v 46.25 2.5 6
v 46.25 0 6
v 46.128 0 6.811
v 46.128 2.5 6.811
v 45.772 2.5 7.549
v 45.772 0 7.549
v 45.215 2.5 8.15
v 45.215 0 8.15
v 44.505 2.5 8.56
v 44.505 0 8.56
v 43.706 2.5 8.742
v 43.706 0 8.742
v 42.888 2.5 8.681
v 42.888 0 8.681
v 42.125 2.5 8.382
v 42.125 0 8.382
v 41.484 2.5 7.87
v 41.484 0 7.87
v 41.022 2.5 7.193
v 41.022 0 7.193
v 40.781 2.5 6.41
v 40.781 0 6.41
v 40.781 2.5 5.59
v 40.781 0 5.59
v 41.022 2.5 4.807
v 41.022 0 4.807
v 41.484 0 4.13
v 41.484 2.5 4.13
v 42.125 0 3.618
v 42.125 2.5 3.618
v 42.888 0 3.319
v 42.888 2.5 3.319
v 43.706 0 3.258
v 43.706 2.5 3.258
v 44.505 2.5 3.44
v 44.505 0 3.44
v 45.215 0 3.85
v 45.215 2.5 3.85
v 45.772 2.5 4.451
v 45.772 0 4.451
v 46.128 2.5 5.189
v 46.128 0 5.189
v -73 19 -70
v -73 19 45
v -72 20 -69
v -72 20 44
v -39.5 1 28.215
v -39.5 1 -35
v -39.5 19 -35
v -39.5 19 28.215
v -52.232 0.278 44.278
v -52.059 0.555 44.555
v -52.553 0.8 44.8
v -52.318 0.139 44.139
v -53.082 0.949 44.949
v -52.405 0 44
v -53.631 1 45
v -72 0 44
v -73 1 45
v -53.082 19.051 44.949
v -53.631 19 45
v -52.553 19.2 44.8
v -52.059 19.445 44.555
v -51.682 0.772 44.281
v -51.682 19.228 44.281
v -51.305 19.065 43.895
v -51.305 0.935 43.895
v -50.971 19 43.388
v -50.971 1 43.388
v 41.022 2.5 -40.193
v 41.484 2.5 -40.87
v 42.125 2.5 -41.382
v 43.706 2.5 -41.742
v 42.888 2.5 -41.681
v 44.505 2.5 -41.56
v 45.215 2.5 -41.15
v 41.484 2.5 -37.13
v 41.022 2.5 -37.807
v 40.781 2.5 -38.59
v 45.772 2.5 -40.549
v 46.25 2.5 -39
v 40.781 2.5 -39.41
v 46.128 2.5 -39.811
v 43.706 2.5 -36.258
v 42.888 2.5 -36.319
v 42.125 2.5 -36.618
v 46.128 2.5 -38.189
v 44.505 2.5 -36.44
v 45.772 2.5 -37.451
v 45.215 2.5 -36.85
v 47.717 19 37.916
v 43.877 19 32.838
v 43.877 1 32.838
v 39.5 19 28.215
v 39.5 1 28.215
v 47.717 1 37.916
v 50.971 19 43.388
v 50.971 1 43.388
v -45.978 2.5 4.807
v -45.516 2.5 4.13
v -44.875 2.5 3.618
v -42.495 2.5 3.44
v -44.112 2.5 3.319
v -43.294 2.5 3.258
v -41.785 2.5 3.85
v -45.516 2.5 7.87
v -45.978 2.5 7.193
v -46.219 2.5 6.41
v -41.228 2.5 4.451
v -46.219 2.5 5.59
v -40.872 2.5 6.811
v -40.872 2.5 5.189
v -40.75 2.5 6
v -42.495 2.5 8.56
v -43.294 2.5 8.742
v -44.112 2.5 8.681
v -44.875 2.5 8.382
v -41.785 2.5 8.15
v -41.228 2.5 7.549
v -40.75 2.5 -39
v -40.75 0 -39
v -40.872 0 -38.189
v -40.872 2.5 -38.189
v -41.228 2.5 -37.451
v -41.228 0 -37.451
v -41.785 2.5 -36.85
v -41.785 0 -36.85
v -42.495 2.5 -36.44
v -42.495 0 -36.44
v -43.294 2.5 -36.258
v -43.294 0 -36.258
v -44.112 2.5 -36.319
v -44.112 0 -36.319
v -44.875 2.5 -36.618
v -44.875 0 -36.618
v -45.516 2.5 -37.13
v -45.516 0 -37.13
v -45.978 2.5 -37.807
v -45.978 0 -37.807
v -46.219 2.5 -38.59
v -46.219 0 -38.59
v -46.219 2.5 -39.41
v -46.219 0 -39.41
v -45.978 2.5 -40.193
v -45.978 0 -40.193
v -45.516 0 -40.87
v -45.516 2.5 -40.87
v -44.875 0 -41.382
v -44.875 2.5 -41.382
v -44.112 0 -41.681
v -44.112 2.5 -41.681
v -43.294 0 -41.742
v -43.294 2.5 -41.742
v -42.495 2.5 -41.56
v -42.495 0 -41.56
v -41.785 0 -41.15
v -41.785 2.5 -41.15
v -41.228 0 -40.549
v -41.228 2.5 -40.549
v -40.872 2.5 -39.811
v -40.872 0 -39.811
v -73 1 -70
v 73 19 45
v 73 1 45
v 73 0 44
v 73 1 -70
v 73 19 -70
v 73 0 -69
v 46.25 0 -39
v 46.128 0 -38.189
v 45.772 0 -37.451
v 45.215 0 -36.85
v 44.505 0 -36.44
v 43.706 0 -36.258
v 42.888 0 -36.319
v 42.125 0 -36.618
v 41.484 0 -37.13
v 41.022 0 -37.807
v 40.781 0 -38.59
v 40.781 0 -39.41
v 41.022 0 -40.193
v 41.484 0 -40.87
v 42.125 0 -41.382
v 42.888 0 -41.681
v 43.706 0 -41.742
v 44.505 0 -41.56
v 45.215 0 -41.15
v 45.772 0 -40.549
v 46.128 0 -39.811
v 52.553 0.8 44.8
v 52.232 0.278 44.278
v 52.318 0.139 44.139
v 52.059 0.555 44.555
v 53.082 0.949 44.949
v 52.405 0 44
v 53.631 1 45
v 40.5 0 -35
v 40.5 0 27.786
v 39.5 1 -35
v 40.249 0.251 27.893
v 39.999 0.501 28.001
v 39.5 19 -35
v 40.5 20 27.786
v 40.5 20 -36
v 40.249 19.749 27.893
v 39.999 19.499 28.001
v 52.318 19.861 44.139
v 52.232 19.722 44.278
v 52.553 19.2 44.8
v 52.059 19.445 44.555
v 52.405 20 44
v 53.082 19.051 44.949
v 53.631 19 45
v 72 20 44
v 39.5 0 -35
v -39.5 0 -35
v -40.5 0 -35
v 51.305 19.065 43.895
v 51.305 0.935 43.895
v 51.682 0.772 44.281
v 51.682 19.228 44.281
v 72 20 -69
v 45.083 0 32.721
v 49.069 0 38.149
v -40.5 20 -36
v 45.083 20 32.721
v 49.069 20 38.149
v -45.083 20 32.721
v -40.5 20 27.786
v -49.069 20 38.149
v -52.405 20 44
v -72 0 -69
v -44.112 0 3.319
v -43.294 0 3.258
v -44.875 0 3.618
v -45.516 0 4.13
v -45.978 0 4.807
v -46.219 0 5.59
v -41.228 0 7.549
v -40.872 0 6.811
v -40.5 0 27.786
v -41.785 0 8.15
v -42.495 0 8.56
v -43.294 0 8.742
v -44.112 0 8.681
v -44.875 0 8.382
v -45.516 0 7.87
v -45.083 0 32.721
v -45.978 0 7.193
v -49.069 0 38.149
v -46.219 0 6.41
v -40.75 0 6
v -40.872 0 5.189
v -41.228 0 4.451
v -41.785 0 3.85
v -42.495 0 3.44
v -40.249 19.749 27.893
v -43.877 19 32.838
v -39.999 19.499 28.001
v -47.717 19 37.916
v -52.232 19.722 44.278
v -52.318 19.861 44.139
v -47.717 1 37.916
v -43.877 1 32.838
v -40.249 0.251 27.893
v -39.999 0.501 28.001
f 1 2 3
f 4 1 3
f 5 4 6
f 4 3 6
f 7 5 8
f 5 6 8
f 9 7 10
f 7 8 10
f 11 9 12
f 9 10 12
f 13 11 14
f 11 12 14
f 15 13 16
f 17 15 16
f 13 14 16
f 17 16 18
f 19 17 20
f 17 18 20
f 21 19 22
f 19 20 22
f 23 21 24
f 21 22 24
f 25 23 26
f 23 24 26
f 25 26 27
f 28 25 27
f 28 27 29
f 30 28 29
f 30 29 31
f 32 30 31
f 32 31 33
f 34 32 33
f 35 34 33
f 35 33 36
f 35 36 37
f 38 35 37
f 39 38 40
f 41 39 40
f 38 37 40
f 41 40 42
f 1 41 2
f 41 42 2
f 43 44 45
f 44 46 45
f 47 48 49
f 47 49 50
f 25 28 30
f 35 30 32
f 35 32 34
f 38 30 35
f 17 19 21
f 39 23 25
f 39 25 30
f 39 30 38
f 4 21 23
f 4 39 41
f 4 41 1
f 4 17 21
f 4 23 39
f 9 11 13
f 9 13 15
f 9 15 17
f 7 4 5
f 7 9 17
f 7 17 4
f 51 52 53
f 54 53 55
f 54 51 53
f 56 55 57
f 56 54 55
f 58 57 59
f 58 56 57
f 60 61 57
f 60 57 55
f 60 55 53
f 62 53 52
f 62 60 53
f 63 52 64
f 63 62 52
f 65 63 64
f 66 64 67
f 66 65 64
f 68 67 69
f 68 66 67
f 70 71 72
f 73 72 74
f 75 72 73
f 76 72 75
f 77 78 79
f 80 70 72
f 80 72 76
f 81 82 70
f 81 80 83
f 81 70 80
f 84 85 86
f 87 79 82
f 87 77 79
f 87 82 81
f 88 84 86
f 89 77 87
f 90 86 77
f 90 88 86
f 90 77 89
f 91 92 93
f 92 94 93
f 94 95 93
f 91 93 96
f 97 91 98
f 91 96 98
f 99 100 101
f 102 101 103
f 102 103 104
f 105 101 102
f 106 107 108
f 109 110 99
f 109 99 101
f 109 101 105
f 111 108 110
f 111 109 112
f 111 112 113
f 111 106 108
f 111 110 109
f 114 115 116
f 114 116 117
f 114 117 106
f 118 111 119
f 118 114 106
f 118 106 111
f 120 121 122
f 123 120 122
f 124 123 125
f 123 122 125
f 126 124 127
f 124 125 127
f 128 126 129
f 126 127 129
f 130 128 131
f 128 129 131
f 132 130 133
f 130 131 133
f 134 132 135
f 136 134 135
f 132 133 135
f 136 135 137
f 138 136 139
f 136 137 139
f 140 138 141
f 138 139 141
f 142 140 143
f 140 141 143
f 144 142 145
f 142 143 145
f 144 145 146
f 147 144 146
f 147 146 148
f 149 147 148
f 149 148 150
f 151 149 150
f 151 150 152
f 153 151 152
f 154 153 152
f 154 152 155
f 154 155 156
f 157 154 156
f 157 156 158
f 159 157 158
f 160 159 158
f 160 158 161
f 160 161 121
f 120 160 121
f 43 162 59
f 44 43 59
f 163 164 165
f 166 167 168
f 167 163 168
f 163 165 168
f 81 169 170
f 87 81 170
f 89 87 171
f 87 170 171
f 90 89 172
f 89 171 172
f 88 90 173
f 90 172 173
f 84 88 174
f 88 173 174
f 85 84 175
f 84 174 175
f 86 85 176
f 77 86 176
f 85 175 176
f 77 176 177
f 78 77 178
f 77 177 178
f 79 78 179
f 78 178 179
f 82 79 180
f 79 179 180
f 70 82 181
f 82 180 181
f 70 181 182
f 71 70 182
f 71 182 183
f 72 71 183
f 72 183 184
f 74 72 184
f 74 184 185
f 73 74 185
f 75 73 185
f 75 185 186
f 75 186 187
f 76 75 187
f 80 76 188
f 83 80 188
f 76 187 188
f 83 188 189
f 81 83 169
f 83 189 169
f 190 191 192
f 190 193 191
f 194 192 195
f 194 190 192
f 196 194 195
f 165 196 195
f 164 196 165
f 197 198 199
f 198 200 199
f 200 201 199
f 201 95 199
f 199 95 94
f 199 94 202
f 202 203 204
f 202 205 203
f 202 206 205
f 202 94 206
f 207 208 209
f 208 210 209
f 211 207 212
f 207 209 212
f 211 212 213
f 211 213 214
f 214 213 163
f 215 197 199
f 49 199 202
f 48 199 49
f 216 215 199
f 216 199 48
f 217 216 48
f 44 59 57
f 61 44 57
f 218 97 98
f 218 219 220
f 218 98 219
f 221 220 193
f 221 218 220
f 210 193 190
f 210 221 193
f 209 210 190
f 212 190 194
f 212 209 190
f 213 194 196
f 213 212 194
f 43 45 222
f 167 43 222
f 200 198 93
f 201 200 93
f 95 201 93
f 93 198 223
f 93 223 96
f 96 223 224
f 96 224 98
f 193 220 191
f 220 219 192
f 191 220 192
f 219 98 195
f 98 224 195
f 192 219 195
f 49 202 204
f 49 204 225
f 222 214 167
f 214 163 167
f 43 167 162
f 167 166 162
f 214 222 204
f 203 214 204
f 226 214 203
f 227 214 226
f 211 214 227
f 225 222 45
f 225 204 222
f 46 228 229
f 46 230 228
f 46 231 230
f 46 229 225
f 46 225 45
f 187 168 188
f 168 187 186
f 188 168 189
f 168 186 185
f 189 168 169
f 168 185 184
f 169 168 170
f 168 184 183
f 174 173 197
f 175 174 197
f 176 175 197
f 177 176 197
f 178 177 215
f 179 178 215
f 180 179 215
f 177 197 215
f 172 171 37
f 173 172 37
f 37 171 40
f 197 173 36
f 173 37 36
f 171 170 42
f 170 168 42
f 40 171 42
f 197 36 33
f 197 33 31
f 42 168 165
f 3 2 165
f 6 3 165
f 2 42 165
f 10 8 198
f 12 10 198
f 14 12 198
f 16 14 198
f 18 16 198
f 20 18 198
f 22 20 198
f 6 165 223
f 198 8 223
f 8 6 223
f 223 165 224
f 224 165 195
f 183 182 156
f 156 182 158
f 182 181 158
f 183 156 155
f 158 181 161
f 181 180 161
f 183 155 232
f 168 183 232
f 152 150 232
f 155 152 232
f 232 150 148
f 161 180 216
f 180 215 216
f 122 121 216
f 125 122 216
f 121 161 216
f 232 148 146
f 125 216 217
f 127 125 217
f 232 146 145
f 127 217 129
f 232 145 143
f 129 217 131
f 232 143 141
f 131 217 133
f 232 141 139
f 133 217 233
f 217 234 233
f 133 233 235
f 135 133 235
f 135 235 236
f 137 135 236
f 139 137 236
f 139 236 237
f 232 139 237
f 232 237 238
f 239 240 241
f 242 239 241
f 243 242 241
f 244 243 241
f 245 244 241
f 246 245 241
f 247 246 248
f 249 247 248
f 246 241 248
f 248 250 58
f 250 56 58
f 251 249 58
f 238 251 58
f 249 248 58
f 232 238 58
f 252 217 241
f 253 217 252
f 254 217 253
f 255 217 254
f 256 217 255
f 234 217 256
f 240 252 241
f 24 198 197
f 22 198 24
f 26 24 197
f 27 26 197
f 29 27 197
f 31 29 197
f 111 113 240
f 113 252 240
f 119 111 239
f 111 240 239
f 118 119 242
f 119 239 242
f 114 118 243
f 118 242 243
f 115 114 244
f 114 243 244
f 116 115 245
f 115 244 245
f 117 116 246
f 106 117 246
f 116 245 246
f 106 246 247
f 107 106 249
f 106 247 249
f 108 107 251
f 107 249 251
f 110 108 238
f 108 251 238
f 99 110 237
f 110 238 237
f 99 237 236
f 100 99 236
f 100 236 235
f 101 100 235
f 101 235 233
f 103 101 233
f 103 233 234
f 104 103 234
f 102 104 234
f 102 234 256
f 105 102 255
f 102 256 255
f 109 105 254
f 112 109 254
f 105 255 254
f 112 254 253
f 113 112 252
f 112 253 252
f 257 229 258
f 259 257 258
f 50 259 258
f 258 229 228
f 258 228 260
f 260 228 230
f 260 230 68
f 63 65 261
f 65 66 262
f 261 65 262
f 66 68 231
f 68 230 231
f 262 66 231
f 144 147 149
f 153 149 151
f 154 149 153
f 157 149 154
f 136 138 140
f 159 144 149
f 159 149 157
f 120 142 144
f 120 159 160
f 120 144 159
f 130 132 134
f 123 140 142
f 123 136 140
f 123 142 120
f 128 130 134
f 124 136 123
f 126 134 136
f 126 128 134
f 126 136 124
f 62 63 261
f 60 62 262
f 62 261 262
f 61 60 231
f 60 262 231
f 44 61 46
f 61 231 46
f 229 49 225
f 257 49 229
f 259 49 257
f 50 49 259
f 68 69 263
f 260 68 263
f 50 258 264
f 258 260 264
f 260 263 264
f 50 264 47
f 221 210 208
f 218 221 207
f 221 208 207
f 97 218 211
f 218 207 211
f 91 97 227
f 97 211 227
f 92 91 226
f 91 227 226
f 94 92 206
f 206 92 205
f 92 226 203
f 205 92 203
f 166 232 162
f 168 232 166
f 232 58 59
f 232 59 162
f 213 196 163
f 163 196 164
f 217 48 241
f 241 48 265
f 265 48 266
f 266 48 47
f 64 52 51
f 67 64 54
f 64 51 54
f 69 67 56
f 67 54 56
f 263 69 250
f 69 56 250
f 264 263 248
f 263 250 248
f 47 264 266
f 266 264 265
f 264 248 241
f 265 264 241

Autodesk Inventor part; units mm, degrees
ref_plane "YZ Plane" through (0, 0, 0) normal (1, 0, 0) x (0, 1, 0)
ref_plane "XZ Plane" through (0, 0, 0) normal (0, 1, 0) x (-1, 0, 0)
ref_plane "XY Plane" through (0, 0, 0) normal (0, 0, 1) x (1, 0, 0)
sketch "Sketch1" plane through (0, 0, 0) normal (0, 1, 0) x (-1, 0, 0)
  line L0 (73, 70) -> (-73, 70)
  line L1 (-73, 70) -> (-73, -70)
  line L2 (-73, -70) -> (73, -70)
  line L3 (73, -70) -> (73, 70)
  line L4 (73, 70) -> (-73, -70) construction
  line L5 (-73, 70) -> (73, -70) construction
  line L6 (-73, -70) -> (73, -70)
  line L7 (73, -70) -> (73, 45)
  line L8 (73, 45) -> (-73, 45)
  line L9 (-73, 45) -> (-73, -70)
  circle A0 centre (0, 70) radius 57.5
  line L10 (39.5, 175) -> (-39.5, 175)
  line L11 (-39.5, 175) -> (-39.5, -35)
  line L12 (-39.5, -35) -> (39.5, -35)
  line L13 (39.5, -35) -> (39.5, 175)
  line L14 (39.5, 175) -> (-39.5, -35) construction
  line L15 (-39.5, 175) -> (39.5, -35) construction
  point P0 (0, 0)
  point P1 (-39.5, 28.2148)
  point P2 (-51.7808, 45)
  point P3 (51.7808, 45)
  point P4 (39.5, 28.2148)
  dimension "d0" = 146
  dimension "d1" = 140
  dimension "d2" = 115
  dimension "d3" = 115
  dimension "d4" = 210
  dimension "d5" = 79
extrude "Extrusion1" add sketch "Sketch1" along normal blind 20 contours L3 L2 L1 L8 A0 L11 L12 L13
sketch "Sketch2" plane through (0, 0, 0) normal (0, -1, 0) x (1, 0, 0)
  circle A0 centre (-43.5, -39) radius 2.75
  circle A1 centre (43.5, -39) radius 2.75
  line L0 (-39.5, 28.2148) -> (-39.5, -35) projected
  line L1 (-39.5, -35) -> (39.5, -35) projected
  line L2 (39.5, -35) -> (39.5, 28.2148) projected
  circle A2 centre (43.5, 6) radius 2.75
  circle A3 centre (-43.5, 6) radius 2.75
  point P0 (0, 0)
  dimension "d8" = 5.5
  dimension "d9" = 5.5
  dimension "d10" = 4
  dimension "d11" = 4
  dimension "d12" = 4
  dimension "d13" = 4
  dimension "d14" = 5.5
  dimension "d15" = 5.5
  dimension "d16" = 45
  dimension "d17" = 45
extrude "Extrusion2" cut sketch "Sketch2" against normal blind 2.5
chamfer "Chamfer1" distance 1 angle 45 18 edges at (-46.4056, 0, 36.0475) (-46.4056, 20, 36.0475) (-62.3904, 20, 45) (-62.3904, 0, 45) (46.4056, 0, 36.0475) (46.4056, 20, 36.0475) (62.3904, 20, 45) (62.3904, 0, 45) (73, 20, -12.5) (-73, 20, -12.5) (-73, 0, -12.5) (0, 20, -70) (0, 0, -70) (-39.5, 20, -3.3926) (-39.5, 0, -3.3926) (0, 20, -35) (39.5, 20, -3.3926) (39.5, 0, -3.3926)
fillet "Fillet1" radius 3 2 edges at (51.7808, 10, 45) (-51.7808, 10, 45)
properties part number "Spacer 1"
